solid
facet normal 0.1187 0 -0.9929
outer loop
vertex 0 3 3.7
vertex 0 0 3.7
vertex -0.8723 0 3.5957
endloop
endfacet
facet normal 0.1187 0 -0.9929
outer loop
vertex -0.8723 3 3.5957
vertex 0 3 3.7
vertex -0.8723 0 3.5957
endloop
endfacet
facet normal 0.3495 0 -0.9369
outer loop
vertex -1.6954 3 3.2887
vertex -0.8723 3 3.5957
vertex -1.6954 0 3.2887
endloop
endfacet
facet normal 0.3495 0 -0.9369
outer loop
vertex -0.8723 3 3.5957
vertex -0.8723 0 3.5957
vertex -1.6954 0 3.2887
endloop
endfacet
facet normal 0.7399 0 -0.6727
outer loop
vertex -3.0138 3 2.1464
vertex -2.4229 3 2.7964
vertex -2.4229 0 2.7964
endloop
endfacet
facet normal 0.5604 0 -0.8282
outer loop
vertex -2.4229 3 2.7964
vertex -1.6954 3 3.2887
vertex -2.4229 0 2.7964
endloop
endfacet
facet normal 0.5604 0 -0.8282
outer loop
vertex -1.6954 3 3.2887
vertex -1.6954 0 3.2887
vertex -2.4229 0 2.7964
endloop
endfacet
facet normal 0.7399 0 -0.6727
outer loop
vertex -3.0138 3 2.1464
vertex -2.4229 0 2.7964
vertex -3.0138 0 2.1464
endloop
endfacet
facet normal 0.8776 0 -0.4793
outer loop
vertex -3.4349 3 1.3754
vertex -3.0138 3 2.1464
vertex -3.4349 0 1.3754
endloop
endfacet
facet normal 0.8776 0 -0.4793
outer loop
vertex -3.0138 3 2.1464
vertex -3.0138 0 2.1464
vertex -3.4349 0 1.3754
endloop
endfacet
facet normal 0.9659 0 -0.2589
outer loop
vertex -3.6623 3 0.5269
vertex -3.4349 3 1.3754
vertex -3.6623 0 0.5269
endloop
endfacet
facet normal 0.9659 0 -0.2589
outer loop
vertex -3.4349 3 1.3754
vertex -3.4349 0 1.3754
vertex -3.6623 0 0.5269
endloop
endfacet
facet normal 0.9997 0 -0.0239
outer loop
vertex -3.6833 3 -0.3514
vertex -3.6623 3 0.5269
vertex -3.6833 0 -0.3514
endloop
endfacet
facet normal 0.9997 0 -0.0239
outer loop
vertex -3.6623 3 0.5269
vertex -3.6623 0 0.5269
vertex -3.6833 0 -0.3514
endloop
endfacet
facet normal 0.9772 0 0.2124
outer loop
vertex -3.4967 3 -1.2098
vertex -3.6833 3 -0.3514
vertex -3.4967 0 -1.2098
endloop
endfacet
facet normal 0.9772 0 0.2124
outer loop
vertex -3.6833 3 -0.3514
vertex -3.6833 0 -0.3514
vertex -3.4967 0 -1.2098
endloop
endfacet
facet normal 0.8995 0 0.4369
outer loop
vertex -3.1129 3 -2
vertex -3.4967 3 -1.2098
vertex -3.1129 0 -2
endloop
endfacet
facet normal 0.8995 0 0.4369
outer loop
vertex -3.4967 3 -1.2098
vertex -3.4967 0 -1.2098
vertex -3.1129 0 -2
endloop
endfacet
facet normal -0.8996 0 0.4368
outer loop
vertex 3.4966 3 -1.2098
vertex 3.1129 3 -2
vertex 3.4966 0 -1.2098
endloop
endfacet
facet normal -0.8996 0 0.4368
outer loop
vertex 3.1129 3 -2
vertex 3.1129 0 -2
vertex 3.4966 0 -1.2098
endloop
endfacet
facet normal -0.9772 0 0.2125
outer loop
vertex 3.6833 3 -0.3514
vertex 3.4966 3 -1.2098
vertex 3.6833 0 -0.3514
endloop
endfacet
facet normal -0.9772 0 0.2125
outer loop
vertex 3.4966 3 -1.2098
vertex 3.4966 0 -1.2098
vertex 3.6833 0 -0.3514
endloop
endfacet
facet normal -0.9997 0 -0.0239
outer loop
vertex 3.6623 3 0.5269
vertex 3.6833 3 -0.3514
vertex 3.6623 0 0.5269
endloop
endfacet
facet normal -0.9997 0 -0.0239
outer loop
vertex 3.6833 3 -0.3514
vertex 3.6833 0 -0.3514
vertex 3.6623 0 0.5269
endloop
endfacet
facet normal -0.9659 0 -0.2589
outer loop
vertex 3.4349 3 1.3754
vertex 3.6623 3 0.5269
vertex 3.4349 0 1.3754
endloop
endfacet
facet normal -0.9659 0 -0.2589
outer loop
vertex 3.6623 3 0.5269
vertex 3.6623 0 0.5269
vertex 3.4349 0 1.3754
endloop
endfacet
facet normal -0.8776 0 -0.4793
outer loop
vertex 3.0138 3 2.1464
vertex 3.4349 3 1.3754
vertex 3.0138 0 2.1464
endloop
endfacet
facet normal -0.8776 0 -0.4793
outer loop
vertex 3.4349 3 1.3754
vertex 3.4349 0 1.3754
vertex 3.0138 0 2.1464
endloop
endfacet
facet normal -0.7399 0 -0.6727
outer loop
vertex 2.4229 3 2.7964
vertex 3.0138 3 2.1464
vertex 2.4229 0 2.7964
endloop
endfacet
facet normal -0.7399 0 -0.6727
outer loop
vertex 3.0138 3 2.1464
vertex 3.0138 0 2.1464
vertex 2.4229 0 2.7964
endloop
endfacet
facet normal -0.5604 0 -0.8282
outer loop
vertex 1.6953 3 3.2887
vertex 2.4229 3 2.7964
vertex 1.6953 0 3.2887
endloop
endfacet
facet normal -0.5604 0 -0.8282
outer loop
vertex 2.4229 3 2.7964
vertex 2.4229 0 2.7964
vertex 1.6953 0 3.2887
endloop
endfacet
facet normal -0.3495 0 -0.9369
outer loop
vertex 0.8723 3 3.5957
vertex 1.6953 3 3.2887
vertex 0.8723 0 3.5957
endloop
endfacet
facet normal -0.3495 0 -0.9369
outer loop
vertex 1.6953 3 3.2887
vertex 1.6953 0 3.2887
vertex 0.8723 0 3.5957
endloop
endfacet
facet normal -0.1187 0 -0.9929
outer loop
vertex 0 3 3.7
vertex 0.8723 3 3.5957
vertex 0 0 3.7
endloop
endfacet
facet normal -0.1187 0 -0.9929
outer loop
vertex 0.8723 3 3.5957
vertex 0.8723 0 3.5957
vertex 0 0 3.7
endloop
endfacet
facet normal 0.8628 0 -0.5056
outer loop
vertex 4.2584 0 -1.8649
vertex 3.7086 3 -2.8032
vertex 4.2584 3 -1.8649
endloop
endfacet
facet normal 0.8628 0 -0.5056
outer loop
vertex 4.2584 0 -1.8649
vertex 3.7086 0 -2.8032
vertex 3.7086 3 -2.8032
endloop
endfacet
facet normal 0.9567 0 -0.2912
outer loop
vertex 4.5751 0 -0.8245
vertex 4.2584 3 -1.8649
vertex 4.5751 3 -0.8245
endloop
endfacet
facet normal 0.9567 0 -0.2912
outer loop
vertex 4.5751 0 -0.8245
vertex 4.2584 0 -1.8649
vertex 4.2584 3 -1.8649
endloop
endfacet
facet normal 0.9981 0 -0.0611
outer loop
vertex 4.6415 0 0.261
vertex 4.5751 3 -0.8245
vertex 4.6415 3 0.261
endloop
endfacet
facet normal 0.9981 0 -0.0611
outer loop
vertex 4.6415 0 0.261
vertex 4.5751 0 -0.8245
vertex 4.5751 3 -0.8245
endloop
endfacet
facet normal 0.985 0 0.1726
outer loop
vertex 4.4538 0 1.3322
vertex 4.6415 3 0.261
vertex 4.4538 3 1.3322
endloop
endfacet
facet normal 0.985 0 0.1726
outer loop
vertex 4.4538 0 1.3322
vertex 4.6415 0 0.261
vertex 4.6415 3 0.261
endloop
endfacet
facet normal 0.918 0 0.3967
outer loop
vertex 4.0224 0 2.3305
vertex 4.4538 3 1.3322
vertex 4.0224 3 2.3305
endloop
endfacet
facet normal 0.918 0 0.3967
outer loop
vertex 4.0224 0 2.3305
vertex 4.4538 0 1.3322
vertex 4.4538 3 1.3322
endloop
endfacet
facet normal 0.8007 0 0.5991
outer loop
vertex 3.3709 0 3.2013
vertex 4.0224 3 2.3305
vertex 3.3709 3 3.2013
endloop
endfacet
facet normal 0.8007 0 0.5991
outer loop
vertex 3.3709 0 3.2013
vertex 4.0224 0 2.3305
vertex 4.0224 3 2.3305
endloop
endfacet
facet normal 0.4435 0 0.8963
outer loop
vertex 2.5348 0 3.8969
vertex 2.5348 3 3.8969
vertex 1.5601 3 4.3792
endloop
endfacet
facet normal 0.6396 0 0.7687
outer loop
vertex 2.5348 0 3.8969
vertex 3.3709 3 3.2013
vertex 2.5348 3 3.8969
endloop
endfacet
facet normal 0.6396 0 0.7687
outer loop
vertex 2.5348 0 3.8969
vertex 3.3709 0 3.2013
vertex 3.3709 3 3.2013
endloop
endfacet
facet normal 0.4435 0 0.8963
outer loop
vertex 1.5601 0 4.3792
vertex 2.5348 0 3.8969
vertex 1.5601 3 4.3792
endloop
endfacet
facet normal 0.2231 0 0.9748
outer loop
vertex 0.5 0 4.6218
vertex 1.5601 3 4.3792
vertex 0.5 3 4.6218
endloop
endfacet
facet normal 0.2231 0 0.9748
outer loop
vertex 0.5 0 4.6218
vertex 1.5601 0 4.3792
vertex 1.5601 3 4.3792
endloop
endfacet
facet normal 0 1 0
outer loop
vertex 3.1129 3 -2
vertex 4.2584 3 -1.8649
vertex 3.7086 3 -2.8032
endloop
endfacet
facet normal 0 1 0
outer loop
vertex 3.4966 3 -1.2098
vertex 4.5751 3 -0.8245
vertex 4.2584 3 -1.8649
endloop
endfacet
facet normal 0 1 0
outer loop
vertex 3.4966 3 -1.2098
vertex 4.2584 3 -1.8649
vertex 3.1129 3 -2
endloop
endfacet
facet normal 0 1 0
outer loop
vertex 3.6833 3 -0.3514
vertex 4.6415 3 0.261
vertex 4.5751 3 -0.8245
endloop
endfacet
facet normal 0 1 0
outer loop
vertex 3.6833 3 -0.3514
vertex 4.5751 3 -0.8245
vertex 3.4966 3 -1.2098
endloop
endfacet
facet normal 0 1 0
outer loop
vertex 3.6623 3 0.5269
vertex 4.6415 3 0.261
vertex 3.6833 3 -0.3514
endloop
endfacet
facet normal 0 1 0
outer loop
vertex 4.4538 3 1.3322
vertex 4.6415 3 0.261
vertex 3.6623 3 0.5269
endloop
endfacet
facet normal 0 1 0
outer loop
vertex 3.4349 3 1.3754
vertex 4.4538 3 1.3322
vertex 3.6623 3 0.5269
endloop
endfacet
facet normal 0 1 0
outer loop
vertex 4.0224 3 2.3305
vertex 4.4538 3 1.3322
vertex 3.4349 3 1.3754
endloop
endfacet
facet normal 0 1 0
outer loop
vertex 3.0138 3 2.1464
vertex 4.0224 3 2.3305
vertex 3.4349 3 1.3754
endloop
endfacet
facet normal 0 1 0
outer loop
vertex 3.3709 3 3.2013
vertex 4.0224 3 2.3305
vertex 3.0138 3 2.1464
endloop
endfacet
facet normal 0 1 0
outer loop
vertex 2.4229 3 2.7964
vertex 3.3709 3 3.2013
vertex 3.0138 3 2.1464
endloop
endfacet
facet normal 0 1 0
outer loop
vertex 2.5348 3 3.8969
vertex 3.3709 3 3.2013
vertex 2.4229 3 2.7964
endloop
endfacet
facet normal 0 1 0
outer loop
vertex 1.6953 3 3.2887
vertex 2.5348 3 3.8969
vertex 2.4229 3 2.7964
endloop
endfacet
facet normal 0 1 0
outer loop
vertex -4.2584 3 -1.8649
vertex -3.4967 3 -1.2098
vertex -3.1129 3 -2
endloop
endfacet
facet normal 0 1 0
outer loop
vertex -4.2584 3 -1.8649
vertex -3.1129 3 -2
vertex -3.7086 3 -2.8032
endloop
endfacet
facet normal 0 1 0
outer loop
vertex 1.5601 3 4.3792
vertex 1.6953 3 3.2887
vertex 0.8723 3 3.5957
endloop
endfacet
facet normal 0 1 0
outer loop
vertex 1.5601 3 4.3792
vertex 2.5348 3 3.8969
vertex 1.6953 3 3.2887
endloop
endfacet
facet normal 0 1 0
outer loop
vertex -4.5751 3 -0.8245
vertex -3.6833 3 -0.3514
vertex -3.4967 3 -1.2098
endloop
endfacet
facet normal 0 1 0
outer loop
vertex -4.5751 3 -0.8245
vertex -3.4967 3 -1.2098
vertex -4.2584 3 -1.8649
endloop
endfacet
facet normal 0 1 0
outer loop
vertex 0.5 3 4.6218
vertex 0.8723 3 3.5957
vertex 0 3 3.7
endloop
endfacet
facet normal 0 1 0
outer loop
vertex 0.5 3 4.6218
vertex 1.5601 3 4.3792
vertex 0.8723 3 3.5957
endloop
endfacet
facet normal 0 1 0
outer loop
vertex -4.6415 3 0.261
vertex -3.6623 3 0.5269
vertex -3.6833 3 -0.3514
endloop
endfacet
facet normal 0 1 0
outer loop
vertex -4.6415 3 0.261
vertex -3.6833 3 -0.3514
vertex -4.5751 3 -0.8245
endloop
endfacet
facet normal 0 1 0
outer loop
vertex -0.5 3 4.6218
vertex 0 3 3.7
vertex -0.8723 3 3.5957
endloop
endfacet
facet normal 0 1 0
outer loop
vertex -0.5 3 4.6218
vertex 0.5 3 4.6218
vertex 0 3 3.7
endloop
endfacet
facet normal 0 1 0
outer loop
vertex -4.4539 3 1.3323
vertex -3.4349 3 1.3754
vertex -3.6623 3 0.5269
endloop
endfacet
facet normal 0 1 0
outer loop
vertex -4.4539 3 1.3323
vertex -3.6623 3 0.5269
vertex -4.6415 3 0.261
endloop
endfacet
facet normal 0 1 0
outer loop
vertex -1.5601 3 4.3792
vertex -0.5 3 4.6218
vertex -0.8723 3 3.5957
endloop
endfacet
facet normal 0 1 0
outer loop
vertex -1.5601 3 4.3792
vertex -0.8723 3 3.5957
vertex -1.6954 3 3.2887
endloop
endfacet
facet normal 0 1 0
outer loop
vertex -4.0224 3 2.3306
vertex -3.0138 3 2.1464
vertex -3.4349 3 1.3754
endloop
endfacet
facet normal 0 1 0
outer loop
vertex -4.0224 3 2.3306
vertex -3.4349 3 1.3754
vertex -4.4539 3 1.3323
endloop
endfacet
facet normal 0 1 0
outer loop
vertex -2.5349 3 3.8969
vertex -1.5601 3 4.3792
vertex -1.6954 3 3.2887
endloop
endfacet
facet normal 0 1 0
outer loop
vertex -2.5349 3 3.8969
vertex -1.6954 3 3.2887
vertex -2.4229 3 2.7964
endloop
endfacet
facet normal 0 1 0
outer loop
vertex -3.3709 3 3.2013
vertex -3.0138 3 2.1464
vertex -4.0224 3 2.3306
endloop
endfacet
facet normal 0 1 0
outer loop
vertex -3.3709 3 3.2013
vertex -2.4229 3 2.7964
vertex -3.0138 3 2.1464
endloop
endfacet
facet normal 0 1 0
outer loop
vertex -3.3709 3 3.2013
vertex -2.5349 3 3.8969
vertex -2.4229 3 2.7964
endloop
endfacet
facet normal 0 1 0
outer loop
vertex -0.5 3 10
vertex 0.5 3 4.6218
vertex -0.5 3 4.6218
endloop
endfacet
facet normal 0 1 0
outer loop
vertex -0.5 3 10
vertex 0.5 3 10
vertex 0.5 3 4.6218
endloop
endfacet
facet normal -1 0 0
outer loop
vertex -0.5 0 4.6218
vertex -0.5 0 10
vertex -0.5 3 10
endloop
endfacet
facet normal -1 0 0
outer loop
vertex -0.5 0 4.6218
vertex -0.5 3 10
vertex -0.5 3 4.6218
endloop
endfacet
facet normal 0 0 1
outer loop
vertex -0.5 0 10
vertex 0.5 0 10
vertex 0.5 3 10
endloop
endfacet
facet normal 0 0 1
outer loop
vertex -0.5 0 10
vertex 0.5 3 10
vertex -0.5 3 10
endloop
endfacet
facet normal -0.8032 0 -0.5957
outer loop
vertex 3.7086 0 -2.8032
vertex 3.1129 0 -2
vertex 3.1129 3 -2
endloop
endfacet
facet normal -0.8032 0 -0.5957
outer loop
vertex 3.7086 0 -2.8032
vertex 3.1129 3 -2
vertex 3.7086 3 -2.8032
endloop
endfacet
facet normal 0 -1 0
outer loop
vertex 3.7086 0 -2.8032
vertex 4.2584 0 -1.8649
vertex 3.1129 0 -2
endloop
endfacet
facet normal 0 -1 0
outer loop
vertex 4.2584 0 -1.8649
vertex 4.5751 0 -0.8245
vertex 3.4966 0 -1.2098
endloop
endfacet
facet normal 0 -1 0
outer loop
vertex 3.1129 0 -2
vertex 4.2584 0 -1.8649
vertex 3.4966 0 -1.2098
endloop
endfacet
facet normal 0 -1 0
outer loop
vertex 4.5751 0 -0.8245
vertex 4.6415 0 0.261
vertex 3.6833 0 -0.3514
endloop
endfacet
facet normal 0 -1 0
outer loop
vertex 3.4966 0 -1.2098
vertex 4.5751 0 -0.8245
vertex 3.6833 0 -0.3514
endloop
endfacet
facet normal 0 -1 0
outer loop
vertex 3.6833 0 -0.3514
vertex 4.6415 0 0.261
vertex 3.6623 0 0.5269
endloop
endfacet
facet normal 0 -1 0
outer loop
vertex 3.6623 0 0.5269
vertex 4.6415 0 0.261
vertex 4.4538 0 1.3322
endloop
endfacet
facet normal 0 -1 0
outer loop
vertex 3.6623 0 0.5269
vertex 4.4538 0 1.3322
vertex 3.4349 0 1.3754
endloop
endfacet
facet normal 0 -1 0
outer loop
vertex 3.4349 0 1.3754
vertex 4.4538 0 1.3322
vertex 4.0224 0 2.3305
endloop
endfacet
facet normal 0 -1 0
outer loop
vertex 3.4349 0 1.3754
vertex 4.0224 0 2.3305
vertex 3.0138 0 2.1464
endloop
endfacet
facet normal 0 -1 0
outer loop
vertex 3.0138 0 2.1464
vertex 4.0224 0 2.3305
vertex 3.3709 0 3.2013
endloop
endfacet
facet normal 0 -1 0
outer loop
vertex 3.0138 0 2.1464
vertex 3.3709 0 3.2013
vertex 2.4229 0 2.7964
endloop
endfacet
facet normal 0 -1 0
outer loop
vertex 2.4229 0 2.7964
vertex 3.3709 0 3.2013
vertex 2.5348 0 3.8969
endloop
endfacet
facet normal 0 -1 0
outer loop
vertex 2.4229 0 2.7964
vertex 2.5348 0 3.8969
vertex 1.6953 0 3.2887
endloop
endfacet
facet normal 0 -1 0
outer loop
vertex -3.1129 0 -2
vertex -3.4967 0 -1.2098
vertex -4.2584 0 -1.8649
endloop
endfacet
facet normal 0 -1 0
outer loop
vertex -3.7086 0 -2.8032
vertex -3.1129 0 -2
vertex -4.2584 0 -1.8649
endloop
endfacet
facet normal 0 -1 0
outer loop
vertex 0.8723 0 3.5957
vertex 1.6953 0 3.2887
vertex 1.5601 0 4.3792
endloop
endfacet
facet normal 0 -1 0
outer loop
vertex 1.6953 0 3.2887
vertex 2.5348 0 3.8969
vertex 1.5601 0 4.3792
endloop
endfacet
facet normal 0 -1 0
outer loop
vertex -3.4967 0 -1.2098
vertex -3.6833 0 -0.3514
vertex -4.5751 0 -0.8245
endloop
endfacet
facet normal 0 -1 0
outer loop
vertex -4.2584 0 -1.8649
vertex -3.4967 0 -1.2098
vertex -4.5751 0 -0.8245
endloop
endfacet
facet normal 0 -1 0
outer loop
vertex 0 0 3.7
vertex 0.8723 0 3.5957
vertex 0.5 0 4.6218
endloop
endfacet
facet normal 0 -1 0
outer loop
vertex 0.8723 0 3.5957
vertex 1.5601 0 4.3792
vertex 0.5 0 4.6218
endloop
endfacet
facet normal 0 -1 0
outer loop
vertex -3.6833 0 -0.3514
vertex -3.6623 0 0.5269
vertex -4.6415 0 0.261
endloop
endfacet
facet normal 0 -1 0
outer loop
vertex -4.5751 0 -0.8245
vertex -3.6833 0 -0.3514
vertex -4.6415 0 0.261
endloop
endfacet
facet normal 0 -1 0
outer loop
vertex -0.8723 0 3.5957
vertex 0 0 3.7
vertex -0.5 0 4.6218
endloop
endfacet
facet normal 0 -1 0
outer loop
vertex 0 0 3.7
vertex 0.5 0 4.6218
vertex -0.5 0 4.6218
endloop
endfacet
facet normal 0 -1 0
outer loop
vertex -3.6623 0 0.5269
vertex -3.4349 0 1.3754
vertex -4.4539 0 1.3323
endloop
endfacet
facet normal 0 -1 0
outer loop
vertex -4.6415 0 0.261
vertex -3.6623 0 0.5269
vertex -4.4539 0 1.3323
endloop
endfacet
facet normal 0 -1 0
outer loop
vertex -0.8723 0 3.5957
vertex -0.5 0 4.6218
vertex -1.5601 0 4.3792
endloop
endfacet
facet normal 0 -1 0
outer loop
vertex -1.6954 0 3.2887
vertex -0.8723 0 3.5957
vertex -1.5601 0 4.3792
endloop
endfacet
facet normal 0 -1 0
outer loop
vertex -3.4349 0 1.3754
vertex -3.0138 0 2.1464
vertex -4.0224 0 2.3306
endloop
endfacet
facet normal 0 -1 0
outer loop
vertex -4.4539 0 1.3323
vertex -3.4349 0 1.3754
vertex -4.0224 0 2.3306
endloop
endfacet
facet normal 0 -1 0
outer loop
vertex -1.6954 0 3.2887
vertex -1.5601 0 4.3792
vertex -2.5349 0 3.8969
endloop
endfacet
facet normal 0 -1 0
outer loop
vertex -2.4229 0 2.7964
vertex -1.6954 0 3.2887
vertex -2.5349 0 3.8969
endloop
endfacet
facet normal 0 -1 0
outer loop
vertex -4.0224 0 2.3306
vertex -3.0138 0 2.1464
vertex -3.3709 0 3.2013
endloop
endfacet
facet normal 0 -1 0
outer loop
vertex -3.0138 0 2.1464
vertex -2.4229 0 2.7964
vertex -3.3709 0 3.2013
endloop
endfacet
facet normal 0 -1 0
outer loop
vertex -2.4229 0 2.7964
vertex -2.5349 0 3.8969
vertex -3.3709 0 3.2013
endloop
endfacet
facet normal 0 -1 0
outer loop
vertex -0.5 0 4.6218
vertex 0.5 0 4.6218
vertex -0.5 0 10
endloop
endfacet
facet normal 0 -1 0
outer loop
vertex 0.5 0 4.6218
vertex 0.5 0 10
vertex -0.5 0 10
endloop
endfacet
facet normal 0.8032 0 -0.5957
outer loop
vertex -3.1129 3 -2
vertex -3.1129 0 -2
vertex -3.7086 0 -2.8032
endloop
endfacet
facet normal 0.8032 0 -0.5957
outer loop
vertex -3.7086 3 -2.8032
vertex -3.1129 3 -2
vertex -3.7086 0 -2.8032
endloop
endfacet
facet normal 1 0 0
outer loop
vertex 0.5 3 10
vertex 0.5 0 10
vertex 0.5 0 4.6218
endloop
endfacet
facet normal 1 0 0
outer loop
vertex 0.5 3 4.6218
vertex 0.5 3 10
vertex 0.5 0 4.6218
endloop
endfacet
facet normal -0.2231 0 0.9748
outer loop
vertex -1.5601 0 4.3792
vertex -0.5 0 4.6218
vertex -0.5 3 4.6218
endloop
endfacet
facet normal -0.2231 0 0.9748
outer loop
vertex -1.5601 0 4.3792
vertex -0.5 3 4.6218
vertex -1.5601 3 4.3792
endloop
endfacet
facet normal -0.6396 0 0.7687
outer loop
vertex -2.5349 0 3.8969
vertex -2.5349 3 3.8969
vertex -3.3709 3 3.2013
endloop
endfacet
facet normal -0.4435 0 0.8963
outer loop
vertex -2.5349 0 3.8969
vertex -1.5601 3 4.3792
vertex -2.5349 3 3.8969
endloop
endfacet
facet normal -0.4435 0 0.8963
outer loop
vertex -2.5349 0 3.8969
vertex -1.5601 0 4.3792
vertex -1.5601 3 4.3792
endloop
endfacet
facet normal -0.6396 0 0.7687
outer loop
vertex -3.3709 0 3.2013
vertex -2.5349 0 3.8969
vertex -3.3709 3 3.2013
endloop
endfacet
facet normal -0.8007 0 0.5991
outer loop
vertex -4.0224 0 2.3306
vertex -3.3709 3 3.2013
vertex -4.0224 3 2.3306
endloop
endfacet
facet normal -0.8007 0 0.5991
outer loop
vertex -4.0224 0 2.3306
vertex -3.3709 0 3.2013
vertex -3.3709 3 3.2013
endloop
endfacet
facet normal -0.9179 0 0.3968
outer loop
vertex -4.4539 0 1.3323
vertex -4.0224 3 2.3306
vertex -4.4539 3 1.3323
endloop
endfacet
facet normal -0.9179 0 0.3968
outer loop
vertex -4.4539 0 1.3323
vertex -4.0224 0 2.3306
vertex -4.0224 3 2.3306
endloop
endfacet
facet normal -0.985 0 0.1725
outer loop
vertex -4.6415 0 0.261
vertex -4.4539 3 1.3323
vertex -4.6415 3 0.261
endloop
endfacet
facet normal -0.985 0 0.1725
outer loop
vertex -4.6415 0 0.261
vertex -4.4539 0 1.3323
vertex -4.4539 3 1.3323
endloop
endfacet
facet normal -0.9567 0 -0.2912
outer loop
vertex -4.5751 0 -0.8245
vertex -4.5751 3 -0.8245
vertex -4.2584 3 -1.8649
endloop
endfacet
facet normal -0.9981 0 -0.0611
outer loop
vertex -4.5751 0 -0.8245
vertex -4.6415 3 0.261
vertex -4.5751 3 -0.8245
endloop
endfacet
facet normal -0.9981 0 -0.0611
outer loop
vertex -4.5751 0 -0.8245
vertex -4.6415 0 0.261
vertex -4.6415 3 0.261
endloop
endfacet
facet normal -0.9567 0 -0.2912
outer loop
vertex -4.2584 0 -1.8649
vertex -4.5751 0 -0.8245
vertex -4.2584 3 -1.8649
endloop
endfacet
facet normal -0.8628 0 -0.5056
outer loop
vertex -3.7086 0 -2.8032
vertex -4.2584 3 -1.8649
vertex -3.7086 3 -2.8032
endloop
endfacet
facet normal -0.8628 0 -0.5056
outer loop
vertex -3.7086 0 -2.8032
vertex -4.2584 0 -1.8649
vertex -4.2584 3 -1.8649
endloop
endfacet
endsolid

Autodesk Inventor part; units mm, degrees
ref_plane "YZ Plane" through (0, 0, 0) normal (1, 0, 0) x (0, 1, 0)
ref_plane "XZ Plane" through (0, 0, 0) normal (0, 1, 0) x (-1, 0, 0)
ref_plane "XY Plane" through (0, 0, 0) normal (0, 0, 1) x (1, 0, 0)
sketch "Sketch1" plane through (0, 0, 0) normal (0, 1, 0) x (-1, 0, 0)
  arc A0 (3.1129, -2) -> (0, 3.7) centre (0, 0) ccw
  line L0 (3.1129, -2) -> (3.7086, -2.8032)
  arc A1 (3.7086, -2.8032) -> (0.5, 4.6218) centre (0, 0) ccw
  line L1 (0, 10) -> (0.5, 10)
  line L2 (0.5, 10) -> (0.5, 4.6218)
  line L3 (0, 3.7) -> (0, 10)
  arc A2 (0, 3.7) -> (-3.1129, -2) centre (0, 0) ccw
  line L4 (-3.1129, -2) -> (-3.7086, -2.8032)
  arc A3 (-0.5, 4.6218) -> (-3.7086, -2.8032) centre (0, 0) ccw
  line L5 (0, 10) -> (-0.5, 10)
  line L6 (-0.5, 10) -> (-0.5, 4.6218)
  dimension "d0" = 10
  dimension "d1" = 7.4
  dimension "d3" = 1
  dimension "d4" = 0.5
extrude "Extrusion1" add sketch "Sketch1" along normal blind 3
properties part number "Microphone holder"
